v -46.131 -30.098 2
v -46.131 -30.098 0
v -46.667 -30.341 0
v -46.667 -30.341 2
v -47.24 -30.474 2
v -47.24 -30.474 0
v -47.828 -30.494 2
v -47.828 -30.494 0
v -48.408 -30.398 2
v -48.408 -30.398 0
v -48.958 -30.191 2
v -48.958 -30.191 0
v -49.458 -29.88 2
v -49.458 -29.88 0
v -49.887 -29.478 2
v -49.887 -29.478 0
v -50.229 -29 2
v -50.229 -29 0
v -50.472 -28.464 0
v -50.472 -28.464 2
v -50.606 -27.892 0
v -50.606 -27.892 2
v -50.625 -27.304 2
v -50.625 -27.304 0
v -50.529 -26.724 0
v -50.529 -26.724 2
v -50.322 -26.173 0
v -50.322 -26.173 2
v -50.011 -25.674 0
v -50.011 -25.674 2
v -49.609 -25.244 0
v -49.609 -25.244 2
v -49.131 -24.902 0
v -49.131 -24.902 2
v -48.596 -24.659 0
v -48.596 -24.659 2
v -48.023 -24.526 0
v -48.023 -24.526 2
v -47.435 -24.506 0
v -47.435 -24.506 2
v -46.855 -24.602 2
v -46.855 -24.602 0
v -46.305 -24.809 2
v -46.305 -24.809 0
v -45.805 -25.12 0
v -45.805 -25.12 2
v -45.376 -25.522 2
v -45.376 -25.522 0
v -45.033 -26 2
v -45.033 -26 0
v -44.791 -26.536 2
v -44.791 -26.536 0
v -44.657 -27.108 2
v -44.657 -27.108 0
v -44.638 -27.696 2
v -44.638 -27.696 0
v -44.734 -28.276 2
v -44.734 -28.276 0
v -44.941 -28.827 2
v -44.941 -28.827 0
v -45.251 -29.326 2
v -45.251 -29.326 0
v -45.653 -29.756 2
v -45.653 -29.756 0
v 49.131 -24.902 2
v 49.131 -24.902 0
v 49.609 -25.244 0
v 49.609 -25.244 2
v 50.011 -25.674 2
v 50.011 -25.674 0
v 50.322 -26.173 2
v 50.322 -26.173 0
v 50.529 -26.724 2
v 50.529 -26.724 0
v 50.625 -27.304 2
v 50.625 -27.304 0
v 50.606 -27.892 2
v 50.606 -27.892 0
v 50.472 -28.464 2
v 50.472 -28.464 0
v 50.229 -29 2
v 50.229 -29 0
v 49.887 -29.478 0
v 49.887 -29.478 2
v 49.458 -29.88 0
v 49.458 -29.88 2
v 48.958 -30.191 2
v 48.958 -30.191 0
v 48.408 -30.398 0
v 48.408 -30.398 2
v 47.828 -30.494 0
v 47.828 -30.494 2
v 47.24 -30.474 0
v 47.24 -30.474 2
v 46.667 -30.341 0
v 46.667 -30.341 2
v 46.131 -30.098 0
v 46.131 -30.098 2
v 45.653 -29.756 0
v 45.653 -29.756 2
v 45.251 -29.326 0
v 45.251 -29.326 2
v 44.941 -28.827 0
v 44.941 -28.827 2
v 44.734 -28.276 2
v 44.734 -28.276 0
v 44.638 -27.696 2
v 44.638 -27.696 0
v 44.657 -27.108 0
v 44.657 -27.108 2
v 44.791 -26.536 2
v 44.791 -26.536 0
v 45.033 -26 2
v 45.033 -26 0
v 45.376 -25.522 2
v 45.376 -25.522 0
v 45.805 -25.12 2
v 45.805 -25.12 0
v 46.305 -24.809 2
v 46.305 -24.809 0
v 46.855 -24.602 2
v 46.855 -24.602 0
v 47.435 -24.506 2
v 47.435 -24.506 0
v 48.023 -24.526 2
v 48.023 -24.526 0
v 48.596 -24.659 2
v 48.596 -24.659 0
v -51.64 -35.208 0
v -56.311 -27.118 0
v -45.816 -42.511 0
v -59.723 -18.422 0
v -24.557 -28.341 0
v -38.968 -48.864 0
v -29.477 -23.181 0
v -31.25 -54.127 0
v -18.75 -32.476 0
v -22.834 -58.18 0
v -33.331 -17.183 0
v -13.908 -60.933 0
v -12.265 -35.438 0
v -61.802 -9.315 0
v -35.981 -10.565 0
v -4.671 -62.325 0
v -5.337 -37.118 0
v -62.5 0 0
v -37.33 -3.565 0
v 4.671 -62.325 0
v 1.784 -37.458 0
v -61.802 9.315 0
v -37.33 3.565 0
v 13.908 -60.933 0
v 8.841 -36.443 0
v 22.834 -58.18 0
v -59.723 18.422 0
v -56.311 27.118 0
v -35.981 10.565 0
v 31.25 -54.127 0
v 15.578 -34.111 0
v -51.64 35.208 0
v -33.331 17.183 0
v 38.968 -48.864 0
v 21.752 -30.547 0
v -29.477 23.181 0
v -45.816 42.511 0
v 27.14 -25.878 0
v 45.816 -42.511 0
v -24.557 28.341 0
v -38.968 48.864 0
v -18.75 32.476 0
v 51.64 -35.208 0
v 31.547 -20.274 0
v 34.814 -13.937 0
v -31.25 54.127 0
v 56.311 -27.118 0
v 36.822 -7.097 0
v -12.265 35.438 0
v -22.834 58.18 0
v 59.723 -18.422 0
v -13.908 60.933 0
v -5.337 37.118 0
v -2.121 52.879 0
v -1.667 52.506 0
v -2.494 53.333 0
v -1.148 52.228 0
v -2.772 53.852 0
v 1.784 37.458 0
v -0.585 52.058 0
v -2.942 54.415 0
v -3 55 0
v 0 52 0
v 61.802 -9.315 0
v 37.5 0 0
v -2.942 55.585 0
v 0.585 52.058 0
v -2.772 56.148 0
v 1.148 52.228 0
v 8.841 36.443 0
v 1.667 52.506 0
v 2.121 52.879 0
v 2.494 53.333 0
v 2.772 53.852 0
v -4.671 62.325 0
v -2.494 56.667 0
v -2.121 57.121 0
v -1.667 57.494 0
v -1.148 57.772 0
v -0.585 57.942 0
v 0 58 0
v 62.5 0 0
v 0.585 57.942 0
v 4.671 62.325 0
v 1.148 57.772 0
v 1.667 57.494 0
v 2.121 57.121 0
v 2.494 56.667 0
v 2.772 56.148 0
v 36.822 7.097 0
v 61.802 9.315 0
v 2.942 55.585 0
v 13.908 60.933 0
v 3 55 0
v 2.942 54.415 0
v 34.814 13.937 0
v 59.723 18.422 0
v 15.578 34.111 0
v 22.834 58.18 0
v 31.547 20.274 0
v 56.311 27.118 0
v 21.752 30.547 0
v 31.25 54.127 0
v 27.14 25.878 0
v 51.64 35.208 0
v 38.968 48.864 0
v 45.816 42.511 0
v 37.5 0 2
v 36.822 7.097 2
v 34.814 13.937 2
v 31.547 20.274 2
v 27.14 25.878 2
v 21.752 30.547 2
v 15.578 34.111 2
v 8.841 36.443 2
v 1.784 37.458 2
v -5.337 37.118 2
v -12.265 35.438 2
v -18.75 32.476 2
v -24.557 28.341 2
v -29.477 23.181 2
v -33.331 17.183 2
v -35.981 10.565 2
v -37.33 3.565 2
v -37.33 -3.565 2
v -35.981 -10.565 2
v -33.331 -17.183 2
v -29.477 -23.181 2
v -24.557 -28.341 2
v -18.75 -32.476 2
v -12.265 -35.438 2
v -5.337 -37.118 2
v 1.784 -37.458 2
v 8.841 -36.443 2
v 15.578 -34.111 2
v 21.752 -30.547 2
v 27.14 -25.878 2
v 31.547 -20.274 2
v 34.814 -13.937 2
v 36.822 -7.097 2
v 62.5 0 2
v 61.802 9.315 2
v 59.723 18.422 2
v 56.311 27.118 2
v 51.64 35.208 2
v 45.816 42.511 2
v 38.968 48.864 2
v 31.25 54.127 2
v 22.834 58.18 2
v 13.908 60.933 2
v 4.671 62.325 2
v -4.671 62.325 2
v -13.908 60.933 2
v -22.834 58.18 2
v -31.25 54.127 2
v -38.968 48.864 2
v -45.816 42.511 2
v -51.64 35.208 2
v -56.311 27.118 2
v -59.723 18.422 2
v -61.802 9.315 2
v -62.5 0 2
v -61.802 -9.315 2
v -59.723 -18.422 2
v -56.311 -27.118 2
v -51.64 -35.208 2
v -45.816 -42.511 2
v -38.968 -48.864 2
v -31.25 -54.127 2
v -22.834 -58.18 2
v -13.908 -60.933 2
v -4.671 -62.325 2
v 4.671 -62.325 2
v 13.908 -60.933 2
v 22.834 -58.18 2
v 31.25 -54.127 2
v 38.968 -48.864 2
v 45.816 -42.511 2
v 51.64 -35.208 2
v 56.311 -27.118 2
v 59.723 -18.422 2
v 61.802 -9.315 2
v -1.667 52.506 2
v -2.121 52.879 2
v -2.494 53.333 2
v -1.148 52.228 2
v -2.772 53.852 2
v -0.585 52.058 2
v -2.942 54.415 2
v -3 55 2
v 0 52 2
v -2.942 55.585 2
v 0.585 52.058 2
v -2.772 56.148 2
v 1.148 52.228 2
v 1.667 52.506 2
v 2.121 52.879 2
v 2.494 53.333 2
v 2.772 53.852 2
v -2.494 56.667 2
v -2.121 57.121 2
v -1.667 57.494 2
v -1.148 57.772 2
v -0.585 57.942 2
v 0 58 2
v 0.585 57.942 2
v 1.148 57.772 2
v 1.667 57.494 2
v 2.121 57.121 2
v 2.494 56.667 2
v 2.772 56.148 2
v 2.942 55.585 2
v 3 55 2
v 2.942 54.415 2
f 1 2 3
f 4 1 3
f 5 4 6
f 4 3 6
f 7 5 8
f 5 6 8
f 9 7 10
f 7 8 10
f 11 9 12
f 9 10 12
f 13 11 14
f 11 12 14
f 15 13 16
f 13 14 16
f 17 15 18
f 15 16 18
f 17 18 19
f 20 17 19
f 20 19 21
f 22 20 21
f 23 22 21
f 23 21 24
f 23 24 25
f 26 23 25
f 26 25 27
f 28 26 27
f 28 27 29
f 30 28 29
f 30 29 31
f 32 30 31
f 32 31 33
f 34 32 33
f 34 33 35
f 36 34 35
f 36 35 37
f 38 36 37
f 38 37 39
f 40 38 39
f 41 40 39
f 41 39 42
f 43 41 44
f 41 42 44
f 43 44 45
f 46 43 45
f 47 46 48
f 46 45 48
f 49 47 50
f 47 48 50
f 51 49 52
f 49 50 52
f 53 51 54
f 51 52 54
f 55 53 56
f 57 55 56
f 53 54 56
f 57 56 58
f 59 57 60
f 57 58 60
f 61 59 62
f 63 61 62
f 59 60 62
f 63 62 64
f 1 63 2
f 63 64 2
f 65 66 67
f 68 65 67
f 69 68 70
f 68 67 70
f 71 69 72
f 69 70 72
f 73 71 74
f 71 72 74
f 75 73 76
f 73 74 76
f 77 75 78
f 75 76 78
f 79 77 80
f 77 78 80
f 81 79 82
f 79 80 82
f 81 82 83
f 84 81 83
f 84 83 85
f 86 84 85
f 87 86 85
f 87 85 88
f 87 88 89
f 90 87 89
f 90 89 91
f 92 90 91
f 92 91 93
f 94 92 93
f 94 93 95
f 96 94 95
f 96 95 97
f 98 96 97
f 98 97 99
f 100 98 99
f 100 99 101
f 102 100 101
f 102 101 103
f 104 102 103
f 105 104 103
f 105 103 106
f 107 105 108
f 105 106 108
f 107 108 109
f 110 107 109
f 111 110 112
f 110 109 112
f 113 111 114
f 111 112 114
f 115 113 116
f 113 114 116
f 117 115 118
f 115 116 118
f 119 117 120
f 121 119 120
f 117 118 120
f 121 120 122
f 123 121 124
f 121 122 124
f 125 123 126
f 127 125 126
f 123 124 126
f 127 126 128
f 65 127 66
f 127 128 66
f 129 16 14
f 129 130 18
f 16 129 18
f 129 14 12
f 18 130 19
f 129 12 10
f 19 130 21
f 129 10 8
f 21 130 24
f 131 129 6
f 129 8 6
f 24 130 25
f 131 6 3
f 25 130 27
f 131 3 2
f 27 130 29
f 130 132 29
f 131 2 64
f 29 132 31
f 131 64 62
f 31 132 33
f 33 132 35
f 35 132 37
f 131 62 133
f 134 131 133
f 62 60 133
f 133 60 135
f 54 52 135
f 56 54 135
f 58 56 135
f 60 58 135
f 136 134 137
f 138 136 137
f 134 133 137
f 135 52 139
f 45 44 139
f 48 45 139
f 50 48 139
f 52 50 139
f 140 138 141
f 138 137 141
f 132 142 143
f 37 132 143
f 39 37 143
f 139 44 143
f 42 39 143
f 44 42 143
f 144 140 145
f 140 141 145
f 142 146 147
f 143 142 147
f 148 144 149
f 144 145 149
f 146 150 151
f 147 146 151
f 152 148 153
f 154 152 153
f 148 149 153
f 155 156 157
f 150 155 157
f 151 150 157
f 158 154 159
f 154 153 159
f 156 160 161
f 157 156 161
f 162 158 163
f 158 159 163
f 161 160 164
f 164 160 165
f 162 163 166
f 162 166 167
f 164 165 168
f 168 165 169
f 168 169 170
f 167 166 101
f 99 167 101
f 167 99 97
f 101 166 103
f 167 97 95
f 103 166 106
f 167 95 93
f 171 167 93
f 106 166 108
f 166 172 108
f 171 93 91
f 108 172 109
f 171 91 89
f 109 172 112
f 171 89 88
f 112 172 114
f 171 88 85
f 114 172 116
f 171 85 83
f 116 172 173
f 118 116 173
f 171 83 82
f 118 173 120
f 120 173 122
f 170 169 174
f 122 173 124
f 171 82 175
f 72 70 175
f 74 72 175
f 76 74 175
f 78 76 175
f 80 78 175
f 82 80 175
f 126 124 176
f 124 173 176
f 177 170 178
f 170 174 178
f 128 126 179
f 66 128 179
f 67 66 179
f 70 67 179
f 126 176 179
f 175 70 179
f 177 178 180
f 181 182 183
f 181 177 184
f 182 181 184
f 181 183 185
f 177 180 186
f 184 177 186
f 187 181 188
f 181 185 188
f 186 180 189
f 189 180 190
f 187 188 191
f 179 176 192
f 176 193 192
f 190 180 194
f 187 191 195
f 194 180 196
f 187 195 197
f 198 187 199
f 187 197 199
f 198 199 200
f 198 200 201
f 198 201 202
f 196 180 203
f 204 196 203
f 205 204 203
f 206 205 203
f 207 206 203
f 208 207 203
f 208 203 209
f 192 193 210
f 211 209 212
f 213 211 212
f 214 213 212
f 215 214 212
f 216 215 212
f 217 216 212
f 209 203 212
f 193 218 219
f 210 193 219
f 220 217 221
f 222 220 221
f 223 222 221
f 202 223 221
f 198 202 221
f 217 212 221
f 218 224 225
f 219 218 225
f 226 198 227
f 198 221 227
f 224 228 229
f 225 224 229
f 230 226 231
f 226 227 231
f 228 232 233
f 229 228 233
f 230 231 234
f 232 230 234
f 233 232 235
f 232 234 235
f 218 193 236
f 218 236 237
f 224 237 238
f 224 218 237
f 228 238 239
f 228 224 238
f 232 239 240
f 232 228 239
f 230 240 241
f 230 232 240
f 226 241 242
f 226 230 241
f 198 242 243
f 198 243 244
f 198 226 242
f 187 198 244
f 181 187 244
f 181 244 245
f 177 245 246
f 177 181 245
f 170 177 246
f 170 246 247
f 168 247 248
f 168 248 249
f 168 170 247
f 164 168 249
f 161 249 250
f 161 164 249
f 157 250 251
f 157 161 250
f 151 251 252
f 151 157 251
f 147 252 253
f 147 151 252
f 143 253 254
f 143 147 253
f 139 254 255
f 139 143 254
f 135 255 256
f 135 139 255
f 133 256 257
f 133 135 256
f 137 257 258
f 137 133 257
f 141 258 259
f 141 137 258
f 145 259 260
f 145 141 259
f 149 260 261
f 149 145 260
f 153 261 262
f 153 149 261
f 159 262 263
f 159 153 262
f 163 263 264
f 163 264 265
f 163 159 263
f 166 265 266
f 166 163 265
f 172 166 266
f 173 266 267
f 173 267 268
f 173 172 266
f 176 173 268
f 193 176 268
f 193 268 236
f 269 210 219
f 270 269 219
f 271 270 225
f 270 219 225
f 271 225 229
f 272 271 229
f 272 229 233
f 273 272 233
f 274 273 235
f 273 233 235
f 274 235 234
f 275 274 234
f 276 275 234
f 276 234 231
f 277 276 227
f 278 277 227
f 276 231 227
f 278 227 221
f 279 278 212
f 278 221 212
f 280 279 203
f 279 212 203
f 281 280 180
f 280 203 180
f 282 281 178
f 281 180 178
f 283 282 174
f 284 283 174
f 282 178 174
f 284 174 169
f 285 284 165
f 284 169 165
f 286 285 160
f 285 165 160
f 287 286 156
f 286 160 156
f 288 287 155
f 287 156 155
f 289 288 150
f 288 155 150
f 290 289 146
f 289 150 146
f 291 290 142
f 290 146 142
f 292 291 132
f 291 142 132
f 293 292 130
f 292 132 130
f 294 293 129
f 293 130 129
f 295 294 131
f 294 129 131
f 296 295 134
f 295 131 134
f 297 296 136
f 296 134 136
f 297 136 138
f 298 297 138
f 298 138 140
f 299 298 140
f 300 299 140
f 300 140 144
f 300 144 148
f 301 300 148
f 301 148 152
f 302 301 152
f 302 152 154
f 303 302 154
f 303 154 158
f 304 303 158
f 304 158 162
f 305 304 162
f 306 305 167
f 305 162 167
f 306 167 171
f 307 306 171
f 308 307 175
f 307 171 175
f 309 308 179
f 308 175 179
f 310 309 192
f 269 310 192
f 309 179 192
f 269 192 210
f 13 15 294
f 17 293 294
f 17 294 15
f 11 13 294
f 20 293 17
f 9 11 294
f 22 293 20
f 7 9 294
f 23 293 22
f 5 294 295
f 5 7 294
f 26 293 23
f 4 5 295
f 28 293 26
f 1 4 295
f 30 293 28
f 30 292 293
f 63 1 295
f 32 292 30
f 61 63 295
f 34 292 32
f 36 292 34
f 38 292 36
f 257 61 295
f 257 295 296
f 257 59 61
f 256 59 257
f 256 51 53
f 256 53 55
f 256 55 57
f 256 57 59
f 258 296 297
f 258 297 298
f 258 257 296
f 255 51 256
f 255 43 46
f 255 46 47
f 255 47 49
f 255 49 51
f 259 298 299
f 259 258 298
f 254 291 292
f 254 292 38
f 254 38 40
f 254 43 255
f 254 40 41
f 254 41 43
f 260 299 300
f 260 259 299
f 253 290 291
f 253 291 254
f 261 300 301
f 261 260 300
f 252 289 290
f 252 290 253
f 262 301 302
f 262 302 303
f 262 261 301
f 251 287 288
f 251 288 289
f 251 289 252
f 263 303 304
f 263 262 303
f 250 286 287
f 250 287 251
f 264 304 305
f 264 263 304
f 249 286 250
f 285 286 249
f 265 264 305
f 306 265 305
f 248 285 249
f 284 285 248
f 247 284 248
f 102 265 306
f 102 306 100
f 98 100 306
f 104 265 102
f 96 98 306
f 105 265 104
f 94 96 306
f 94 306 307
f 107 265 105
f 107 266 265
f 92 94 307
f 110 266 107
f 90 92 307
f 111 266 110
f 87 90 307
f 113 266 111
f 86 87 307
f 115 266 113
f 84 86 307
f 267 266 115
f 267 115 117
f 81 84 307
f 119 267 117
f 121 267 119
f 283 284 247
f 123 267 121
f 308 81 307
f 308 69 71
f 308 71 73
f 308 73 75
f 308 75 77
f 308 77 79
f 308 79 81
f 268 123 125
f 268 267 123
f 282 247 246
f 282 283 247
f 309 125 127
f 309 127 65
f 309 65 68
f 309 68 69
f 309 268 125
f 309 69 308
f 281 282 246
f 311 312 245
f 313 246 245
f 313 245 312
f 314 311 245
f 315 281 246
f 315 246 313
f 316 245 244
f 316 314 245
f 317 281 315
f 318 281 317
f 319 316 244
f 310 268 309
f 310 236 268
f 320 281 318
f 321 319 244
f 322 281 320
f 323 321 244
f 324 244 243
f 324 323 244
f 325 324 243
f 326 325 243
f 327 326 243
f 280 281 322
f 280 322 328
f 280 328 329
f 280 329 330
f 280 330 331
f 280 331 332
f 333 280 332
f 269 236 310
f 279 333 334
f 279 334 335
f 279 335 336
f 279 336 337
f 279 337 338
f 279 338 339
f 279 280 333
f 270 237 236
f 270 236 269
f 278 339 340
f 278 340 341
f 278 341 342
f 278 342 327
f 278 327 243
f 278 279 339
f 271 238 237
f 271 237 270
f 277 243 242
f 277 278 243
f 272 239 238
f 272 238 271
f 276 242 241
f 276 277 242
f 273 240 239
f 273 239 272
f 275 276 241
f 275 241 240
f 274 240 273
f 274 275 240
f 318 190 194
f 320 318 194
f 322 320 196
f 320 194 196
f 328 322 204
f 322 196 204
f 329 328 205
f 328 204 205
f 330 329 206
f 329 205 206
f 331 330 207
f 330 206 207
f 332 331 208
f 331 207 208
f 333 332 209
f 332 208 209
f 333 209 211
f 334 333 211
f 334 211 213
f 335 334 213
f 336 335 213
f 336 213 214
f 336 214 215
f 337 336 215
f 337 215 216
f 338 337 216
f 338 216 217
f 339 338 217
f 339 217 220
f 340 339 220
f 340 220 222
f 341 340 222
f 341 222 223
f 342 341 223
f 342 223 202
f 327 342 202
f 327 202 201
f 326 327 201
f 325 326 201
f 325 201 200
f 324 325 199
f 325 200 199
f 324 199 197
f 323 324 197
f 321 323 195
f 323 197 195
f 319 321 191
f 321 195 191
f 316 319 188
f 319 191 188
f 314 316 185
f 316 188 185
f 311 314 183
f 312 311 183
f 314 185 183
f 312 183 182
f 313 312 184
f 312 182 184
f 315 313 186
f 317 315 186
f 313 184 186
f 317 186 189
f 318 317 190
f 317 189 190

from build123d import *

# Parameters (mm, degrees)
SKETCH1_R           = 62.5
SKETCH1_R_2         = 37.5
BOSS_EXTRUDE1_DEPTH = 2
SKETCH2_R           = 3
CUT_EXTRUDE1_DEPTH  = 89.41097217
CIRPATTERN1_COUNT   = 3


with BuildPart() as part:
    # Sketch1 → Boss-Extrude1 (new body)
    with BuildSketch(Plane.XY):
        Circle(SKETCH1_R)
        Circle(SKETCH1_R_2, mode=Mode.SUBTRACT)
    extrude(amount=BOSS_EXTRUDE1_DEPTH)

    # Sketch2 → Cut-Extrude1 (cut, through all)
    with BuildSketch(Plane(origin=(0, 0, 0), x_dir=(-1, 0, 0), z_dir=(0, 0, -1))):
        with Locations((0, 55)):
            Circle(SKETCH2_R)
    cut_extrude1 = extrude(amount=-CUT_EXTRUDE1_DEPTH, mode=Mode.SUBTRACT)

    # CirPattern1: Cut-Extrude1 ×3 about axis
    cirpattern1_axis = Axis((0, 0, 0), (0, 0, 1))
    for i in range(1, CIRPATTERN1_COUNT):
        add(cut_extrude1.rotate(cirpattern1_axis, i * 360 / CIRPATTERN1_COUNT), mode=Mode.SUBTRACT)


solid = part.part
